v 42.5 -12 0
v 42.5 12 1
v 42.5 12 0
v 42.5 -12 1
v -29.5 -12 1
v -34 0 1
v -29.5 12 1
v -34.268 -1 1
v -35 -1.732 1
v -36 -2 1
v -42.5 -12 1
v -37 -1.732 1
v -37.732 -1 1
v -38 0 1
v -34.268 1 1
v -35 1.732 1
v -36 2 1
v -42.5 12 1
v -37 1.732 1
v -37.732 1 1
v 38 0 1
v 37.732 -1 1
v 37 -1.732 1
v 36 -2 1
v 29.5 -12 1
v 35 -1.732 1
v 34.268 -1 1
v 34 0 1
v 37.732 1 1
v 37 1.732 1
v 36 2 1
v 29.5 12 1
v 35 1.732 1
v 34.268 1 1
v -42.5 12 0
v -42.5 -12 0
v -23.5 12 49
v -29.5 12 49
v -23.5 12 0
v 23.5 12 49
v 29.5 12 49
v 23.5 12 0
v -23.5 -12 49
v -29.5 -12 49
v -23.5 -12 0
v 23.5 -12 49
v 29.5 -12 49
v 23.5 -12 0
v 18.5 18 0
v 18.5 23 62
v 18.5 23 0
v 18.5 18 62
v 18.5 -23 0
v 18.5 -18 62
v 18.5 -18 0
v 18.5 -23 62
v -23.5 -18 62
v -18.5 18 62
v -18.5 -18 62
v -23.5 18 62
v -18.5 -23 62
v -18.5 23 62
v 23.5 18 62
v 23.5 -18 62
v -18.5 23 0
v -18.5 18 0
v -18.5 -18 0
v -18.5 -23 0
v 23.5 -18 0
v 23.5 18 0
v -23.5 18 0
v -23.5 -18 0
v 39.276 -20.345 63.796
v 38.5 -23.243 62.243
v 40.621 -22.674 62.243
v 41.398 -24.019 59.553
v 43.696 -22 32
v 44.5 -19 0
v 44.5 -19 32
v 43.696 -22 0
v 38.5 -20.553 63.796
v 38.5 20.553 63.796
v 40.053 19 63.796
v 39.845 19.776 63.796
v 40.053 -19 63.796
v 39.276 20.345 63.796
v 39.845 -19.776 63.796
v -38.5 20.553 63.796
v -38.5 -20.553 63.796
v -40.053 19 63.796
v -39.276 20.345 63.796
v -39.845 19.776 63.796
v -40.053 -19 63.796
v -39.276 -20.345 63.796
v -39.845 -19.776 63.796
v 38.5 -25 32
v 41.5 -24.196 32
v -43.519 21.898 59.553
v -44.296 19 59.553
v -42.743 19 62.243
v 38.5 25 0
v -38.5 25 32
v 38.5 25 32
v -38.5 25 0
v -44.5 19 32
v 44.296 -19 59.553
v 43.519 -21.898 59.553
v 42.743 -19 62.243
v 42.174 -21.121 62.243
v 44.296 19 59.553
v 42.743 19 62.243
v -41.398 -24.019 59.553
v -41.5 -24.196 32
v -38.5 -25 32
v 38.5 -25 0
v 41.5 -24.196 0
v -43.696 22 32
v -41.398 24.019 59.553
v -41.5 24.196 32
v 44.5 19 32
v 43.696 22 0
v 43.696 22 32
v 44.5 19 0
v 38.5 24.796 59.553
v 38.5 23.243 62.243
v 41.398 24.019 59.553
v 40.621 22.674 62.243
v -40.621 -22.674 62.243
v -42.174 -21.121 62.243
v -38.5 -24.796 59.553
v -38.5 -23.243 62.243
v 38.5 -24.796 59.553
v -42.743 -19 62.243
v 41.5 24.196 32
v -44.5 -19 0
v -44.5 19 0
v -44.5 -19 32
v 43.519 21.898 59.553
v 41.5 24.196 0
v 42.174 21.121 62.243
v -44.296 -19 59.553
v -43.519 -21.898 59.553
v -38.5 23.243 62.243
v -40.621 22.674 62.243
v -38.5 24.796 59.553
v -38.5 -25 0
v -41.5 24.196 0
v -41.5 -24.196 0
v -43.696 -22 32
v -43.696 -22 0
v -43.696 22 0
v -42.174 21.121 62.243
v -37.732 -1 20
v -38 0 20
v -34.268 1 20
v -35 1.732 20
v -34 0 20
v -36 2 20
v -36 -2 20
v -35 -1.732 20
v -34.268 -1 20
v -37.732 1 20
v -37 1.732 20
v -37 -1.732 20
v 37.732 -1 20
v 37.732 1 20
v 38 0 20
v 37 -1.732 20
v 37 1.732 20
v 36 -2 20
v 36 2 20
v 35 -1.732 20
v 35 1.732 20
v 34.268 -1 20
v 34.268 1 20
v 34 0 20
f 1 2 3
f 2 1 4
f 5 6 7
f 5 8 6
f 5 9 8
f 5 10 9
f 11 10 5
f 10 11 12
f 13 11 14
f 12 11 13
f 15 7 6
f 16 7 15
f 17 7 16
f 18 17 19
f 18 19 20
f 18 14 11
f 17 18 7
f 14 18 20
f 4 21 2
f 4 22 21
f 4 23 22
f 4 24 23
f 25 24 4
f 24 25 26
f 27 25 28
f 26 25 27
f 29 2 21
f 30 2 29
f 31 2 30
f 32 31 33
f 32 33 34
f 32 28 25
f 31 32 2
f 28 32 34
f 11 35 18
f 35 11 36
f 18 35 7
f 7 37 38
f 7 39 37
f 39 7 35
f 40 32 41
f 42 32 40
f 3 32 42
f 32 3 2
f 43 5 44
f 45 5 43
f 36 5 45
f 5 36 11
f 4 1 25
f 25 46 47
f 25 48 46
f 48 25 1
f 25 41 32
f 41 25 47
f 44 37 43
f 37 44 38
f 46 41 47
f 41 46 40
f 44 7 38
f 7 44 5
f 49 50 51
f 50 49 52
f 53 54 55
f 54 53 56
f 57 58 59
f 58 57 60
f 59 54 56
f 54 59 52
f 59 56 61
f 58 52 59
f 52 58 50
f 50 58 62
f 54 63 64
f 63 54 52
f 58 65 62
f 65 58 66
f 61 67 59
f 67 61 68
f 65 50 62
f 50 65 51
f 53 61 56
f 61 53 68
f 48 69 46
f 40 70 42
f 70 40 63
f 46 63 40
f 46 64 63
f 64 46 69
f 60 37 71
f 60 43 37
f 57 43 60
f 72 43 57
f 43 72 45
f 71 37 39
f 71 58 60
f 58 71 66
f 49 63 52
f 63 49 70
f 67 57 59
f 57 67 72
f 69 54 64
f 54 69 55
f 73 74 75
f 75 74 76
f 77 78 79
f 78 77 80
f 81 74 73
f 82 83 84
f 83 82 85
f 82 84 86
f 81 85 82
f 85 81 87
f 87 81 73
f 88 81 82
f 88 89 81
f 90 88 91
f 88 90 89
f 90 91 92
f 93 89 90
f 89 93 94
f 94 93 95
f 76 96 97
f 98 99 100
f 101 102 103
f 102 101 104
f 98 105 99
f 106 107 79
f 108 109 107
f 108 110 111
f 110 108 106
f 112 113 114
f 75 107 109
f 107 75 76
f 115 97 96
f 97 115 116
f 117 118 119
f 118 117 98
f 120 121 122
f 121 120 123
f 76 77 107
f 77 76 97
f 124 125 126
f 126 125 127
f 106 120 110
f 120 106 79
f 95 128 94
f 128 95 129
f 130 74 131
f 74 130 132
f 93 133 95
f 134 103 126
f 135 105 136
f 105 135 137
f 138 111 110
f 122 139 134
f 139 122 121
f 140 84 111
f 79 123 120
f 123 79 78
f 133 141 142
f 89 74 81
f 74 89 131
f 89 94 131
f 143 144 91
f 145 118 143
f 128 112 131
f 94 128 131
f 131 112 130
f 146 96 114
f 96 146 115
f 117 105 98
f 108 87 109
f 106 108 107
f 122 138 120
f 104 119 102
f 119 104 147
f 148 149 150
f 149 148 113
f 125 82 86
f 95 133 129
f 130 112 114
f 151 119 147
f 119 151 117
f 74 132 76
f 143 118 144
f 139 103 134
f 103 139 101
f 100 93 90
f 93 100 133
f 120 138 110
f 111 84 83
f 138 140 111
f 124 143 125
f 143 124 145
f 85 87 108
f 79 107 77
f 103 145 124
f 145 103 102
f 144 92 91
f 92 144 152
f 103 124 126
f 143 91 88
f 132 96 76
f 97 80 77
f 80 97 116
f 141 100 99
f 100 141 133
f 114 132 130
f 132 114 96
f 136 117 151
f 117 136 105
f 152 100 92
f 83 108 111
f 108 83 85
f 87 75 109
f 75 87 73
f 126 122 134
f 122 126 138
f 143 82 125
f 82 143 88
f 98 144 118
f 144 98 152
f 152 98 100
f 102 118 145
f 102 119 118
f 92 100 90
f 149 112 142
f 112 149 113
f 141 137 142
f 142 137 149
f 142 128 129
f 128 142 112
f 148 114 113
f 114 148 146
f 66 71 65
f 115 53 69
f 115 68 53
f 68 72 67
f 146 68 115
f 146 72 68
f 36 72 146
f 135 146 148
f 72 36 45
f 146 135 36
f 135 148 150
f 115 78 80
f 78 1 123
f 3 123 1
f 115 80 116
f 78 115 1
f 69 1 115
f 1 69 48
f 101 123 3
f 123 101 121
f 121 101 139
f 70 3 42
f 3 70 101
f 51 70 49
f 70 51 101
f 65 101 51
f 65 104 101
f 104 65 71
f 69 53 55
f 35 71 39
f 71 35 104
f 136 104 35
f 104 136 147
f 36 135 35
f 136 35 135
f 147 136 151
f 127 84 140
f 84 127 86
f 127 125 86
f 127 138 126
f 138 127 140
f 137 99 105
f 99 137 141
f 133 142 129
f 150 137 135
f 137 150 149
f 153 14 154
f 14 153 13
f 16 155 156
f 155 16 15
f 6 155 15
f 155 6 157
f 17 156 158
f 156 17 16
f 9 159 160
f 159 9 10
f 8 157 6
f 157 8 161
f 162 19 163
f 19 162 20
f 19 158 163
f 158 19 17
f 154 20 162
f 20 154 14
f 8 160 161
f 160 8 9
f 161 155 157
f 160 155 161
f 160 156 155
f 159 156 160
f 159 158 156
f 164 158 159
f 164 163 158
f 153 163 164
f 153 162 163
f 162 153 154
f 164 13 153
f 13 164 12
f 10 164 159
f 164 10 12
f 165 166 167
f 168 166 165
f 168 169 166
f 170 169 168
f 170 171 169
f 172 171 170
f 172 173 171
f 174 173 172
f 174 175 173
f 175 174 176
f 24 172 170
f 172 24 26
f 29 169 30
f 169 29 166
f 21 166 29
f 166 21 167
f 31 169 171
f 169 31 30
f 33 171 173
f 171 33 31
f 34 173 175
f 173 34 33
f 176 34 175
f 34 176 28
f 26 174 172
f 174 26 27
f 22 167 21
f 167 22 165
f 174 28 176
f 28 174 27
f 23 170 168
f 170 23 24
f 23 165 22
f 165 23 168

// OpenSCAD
/*
transformer

od_x 59.5
od_y = 46
od_z = 50

x_middle = 22.5
y_middle = 37
z_mid = 41
*/
$fn=12;

module bellCap_M1120() {
	difference() {
		hull() {
			cube([59.5, 16, 50], center=true);
			translate([0, 22.5/2, 0]) cube([59.5-10, 1, 50 - 10], center=true);
		}
		cube([37, 22.5, 41], center=true);
		
		translate([0,0,-23]) cylinder(r=4/2, h=6, center=true);
		translate([-10,0,-23]) cylinder(r=4/2, h=6, center=true);
		translate([10,0,-23]) cylinder(r=4/2, h=6, center=true);
	}
}

//translate([59.5,46,0]) cube([22.5, 37, 41]);
//cube([59.5, 46, 50])

//bellCap_M1120();

//translate([0,0,25]) cube([59,46,50], center=true);

module roundedCube(x, y, z, r) hull() {
	X = x - r*2;
	Y = y - r*2;
	Z = z - r;
	translate([-X/2, -Y/2, 0]) cylinder(r=r, h=z/2);
	translate([-X/2, Y/2, 0]) cylinder(r=r, h=z/2);
	translate([X/2, -Y/2, 0]) cylinder(r=r, h=z/2);
	translate([X/2, Y/2, 0]) cylinder(r=r, h=z/2);
	
	translate([-X/2, -Y/2, Z]) sphere(r=r);
	translate([-X/2, Y/2, Z]) sphere(r=r);
	translate([X/2, -Y/2, Z]) sphere(r=r);
	translate([X/2, Y/2, Z]) sphere(r=r);
}

difference() {
	wall = 2;
	translate([0,0,0]) roundedCube(85+wall*2, (46+wall*2),50+12+wall, 6);
	
	translate([0,0,-1]) {
		translate([-85/2,-24/2,0]) cube([85,24,2]);
		translate([-59/2, -24/2, 0]) cube([59,24, 50]);
		translate([-37/2, -46/2, 0]) cube([37, 46, 50+12+1]);
		
		translate([-47/2, -36/2, 0]) cube([47, 36, 50+12+1]);
	}
	
	translate([-85/2 + 6.5,0,0]) cylinder(r=4/2, h=20);
	translate([85/2 - 6.5,0,0]) cylinder(r=4/2, h=20);
}

// inputs
// power + & -
// audio signal + & -
// outputs
// + GND -

// incl. tolerance
module transformer() {
	translate([-85/2,-24/2,0]) cube([85,24,1]);
	translate([-59/2, -24/2, 0]) cube([59,24, 50]);
	translate([-37/2, -46/2, (50-41)/2]) cube([37, 46, 41]);
}

// no tolerance
module amp() {
	translate([0,0,11.9/2]) cube([46.2, 35.36, 11.9], center=true);
}

//translate([0,0,50]) amp();
//transformer();
